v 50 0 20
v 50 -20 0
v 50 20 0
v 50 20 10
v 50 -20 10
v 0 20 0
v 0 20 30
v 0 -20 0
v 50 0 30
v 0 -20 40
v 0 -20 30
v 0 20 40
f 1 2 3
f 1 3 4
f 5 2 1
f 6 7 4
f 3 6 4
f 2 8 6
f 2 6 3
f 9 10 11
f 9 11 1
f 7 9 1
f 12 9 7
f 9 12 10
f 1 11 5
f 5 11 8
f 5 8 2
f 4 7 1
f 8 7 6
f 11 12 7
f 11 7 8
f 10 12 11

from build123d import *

# Parameters (mm, degrees)
F1_DEPTH = 20
F6_DEPTH = 16.8440384213


# Not quite as in the source:
# - a pattern or mirror of a feature is missing from the dataset's text; its kind, count and spacing are read off the source's solid
# - a feature names something its author has since deleted; it is built from what else it names


with BuildPart() as f1:
    # F0 (on Front) → F1 (new body, symmetric)
    with BuildSketch(Plane.XZ):
        Polygon((0, 30), (0, 0), (50, 0), (50, 20), align=None)
    extrude(amount=F1_DEPTH, both=True)

    # F5 (on 3pt) → F6 (cut, through all)
    with BuildSketch(Plane(origin=(11.3475177305, -14.1843971631, 28.3687943262), x_dir=(0.9415544714, 0.1506487154, -0.3012974309), z_dir=(-0.3368607684, 0.4210759605, -0.8421519211))):
        Polygon((41.0517749549, 13.416407865), (-12.0518972345, 4.472135955), (41.0517749549, -8.94427191), align=None)
    f6 = extrude(amount=-F6_DEPTH, mode=Mode.SUBTRACT)

    # F6_copies: F6 across plane
    add(f6.mirror(Plane.ZX), mode=Mode.SUBTRACT)

    # F8: sweep along a path in F7
    with BuildLine(Plane(origin=(0, 0, 0), x_dir=(0, -1, 0), z_dir=(-1, 0, 0))) as f8_path:
        Line((20, 30), (20, 40))
    # F1_face1 (on face) → F8 (sweep)
    with BuildSketch(Plane(origin=(16.6666666667, 0, 26.6666666667), x_dir=(1, 0, 0), z_dir=(0.1961161351, 0, 0.9805806757))):
        Polygon((-16.996731712, -20), (33.993463424, 0), (-16.996731712, 20), align=None)
    sweep(path=f8_path.line)


solid = f1.part
